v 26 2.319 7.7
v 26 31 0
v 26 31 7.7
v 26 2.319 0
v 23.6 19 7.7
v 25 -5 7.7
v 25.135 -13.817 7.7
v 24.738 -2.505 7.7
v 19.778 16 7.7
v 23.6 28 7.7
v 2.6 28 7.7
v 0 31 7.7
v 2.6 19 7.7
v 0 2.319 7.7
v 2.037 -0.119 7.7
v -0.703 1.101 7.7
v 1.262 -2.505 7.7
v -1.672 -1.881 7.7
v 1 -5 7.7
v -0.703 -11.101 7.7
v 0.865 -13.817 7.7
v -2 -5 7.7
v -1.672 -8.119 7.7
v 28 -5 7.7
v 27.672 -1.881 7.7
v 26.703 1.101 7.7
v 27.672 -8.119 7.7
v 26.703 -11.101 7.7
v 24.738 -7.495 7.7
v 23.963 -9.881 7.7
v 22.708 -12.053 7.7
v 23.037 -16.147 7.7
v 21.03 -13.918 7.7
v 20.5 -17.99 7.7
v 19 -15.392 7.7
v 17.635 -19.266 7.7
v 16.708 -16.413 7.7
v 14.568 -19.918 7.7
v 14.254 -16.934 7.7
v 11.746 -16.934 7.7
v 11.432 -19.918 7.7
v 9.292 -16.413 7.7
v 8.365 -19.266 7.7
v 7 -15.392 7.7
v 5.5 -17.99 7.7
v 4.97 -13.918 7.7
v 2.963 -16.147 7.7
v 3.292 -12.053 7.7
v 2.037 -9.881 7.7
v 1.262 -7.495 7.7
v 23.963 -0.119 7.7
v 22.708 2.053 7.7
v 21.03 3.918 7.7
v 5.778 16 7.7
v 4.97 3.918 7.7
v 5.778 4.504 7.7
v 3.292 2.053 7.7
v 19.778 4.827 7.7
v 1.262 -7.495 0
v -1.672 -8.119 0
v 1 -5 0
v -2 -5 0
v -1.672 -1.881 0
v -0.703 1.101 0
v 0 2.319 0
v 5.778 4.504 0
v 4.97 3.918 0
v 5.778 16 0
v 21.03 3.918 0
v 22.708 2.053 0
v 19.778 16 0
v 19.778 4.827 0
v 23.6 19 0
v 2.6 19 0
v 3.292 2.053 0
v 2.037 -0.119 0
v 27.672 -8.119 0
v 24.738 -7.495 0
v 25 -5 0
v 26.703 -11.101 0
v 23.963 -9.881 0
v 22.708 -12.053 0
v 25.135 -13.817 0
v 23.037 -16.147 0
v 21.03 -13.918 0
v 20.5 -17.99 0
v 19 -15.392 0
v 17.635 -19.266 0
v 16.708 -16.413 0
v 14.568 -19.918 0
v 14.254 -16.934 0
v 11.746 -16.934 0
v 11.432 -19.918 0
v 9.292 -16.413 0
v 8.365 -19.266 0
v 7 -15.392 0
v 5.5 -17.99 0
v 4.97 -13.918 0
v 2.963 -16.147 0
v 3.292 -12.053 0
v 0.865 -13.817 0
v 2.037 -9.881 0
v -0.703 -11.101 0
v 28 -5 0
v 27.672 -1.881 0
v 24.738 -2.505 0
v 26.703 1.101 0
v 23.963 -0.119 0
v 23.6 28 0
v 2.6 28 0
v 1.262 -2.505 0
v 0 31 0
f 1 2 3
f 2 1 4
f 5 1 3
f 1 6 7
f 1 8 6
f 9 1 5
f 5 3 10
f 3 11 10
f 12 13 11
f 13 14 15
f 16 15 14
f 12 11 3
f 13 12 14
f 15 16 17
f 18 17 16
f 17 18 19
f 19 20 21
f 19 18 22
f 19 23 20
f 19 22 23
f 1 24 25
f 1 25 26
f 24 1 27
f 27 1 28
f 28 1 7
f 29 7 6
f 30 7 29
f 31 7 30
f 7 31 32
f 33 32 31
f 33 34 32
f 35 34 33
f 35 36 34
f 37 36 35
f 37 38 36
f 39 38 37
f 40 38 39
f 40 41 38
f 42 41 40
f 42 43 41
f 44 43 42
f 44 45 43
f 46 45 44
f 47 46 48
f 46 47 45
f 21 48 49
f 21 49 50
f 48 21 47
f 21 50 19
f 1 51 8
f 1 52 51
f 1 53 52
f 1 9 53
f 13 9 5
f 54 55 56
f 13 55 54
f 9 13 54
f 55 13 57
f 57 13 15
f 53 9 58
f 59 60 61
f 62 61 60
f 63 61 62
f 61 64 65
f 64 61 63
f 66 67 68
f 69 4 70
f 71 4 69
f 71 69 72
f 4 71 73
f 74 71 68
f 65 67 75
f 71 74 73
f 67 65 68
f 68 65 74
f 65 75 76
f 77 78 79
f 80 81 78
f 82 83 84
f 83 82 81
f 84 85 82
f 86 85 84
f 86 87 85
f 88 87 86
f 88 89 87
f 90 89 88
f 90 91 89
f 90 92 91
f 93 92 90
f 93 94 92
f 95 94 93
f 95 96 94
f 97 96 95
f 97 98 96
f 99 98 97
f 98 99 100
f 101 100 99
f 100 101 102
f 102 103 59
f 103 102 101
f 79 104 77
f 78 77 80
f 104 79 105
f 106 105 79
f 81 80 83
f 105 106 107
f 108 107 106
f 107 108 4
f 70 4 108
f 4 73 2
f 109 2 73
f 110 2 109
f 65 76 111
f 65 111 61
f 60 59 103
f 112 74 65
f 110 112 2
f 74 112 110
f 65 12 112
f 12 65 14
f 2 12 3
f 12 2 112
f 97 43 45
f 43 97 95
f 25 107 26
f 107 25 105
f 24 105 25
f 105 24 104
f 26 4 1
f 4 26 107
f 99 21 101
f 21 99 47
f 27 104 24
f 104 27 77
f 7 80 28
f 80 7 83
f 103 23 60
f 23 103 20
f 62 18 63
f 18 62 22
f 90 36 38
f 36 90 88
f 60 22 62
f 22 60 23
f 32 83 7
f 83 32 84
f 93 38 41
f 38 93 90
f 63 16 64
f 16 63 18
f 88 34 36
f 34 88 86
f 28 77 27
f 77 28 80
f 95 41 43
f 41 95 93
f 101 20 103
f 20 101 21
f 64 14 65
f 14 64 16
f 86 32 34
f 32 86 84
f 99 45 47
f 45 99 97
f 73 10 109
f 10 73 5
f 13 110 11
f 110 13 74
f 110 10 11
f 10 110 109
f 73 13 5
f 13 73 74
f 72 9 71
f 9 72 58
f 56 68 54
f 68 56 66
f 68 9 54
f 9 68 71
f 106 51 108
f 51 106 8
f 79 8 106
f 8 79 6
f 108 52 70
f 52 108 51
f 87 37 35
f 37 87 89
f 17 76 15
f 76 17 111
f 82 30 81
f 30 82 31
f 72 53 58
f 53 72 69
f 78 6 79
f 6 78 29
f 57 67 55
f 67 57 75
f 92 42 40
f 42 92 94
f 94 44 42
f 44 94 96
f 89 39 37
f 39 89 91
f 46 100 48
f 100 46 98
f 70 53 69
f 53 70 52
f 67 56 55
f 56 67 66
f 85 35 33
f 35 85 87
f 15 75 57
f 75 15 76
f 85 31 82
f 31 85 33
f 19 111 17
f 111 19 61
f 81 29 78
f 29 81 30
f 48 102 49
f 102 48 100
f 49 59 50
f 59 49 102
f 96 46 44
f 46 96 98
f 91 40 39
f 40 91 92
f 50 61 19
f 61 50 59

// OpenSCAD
thickness = 7.7;
width = 26;

circleSize = 15;


difference() {
    union() {
        cube([width, 31, thickness]);
        
        translate([width / 2, -5, 0])
            cylinder(thickness, circleSize, circleSize);
    }

    union() {
        translate([width / 10, 19, 0])
            #cube([21, 9, thickness]); 
        
        // Middle cube
        translate([width / 4.5, 0, 0]) 
            cube([14, 16, thickness]);
        
        // Circle
        translate([width / 2, -5, 0])
            cylinder(thickness, circleSize - 3, circleSize - 3);
    }
}
